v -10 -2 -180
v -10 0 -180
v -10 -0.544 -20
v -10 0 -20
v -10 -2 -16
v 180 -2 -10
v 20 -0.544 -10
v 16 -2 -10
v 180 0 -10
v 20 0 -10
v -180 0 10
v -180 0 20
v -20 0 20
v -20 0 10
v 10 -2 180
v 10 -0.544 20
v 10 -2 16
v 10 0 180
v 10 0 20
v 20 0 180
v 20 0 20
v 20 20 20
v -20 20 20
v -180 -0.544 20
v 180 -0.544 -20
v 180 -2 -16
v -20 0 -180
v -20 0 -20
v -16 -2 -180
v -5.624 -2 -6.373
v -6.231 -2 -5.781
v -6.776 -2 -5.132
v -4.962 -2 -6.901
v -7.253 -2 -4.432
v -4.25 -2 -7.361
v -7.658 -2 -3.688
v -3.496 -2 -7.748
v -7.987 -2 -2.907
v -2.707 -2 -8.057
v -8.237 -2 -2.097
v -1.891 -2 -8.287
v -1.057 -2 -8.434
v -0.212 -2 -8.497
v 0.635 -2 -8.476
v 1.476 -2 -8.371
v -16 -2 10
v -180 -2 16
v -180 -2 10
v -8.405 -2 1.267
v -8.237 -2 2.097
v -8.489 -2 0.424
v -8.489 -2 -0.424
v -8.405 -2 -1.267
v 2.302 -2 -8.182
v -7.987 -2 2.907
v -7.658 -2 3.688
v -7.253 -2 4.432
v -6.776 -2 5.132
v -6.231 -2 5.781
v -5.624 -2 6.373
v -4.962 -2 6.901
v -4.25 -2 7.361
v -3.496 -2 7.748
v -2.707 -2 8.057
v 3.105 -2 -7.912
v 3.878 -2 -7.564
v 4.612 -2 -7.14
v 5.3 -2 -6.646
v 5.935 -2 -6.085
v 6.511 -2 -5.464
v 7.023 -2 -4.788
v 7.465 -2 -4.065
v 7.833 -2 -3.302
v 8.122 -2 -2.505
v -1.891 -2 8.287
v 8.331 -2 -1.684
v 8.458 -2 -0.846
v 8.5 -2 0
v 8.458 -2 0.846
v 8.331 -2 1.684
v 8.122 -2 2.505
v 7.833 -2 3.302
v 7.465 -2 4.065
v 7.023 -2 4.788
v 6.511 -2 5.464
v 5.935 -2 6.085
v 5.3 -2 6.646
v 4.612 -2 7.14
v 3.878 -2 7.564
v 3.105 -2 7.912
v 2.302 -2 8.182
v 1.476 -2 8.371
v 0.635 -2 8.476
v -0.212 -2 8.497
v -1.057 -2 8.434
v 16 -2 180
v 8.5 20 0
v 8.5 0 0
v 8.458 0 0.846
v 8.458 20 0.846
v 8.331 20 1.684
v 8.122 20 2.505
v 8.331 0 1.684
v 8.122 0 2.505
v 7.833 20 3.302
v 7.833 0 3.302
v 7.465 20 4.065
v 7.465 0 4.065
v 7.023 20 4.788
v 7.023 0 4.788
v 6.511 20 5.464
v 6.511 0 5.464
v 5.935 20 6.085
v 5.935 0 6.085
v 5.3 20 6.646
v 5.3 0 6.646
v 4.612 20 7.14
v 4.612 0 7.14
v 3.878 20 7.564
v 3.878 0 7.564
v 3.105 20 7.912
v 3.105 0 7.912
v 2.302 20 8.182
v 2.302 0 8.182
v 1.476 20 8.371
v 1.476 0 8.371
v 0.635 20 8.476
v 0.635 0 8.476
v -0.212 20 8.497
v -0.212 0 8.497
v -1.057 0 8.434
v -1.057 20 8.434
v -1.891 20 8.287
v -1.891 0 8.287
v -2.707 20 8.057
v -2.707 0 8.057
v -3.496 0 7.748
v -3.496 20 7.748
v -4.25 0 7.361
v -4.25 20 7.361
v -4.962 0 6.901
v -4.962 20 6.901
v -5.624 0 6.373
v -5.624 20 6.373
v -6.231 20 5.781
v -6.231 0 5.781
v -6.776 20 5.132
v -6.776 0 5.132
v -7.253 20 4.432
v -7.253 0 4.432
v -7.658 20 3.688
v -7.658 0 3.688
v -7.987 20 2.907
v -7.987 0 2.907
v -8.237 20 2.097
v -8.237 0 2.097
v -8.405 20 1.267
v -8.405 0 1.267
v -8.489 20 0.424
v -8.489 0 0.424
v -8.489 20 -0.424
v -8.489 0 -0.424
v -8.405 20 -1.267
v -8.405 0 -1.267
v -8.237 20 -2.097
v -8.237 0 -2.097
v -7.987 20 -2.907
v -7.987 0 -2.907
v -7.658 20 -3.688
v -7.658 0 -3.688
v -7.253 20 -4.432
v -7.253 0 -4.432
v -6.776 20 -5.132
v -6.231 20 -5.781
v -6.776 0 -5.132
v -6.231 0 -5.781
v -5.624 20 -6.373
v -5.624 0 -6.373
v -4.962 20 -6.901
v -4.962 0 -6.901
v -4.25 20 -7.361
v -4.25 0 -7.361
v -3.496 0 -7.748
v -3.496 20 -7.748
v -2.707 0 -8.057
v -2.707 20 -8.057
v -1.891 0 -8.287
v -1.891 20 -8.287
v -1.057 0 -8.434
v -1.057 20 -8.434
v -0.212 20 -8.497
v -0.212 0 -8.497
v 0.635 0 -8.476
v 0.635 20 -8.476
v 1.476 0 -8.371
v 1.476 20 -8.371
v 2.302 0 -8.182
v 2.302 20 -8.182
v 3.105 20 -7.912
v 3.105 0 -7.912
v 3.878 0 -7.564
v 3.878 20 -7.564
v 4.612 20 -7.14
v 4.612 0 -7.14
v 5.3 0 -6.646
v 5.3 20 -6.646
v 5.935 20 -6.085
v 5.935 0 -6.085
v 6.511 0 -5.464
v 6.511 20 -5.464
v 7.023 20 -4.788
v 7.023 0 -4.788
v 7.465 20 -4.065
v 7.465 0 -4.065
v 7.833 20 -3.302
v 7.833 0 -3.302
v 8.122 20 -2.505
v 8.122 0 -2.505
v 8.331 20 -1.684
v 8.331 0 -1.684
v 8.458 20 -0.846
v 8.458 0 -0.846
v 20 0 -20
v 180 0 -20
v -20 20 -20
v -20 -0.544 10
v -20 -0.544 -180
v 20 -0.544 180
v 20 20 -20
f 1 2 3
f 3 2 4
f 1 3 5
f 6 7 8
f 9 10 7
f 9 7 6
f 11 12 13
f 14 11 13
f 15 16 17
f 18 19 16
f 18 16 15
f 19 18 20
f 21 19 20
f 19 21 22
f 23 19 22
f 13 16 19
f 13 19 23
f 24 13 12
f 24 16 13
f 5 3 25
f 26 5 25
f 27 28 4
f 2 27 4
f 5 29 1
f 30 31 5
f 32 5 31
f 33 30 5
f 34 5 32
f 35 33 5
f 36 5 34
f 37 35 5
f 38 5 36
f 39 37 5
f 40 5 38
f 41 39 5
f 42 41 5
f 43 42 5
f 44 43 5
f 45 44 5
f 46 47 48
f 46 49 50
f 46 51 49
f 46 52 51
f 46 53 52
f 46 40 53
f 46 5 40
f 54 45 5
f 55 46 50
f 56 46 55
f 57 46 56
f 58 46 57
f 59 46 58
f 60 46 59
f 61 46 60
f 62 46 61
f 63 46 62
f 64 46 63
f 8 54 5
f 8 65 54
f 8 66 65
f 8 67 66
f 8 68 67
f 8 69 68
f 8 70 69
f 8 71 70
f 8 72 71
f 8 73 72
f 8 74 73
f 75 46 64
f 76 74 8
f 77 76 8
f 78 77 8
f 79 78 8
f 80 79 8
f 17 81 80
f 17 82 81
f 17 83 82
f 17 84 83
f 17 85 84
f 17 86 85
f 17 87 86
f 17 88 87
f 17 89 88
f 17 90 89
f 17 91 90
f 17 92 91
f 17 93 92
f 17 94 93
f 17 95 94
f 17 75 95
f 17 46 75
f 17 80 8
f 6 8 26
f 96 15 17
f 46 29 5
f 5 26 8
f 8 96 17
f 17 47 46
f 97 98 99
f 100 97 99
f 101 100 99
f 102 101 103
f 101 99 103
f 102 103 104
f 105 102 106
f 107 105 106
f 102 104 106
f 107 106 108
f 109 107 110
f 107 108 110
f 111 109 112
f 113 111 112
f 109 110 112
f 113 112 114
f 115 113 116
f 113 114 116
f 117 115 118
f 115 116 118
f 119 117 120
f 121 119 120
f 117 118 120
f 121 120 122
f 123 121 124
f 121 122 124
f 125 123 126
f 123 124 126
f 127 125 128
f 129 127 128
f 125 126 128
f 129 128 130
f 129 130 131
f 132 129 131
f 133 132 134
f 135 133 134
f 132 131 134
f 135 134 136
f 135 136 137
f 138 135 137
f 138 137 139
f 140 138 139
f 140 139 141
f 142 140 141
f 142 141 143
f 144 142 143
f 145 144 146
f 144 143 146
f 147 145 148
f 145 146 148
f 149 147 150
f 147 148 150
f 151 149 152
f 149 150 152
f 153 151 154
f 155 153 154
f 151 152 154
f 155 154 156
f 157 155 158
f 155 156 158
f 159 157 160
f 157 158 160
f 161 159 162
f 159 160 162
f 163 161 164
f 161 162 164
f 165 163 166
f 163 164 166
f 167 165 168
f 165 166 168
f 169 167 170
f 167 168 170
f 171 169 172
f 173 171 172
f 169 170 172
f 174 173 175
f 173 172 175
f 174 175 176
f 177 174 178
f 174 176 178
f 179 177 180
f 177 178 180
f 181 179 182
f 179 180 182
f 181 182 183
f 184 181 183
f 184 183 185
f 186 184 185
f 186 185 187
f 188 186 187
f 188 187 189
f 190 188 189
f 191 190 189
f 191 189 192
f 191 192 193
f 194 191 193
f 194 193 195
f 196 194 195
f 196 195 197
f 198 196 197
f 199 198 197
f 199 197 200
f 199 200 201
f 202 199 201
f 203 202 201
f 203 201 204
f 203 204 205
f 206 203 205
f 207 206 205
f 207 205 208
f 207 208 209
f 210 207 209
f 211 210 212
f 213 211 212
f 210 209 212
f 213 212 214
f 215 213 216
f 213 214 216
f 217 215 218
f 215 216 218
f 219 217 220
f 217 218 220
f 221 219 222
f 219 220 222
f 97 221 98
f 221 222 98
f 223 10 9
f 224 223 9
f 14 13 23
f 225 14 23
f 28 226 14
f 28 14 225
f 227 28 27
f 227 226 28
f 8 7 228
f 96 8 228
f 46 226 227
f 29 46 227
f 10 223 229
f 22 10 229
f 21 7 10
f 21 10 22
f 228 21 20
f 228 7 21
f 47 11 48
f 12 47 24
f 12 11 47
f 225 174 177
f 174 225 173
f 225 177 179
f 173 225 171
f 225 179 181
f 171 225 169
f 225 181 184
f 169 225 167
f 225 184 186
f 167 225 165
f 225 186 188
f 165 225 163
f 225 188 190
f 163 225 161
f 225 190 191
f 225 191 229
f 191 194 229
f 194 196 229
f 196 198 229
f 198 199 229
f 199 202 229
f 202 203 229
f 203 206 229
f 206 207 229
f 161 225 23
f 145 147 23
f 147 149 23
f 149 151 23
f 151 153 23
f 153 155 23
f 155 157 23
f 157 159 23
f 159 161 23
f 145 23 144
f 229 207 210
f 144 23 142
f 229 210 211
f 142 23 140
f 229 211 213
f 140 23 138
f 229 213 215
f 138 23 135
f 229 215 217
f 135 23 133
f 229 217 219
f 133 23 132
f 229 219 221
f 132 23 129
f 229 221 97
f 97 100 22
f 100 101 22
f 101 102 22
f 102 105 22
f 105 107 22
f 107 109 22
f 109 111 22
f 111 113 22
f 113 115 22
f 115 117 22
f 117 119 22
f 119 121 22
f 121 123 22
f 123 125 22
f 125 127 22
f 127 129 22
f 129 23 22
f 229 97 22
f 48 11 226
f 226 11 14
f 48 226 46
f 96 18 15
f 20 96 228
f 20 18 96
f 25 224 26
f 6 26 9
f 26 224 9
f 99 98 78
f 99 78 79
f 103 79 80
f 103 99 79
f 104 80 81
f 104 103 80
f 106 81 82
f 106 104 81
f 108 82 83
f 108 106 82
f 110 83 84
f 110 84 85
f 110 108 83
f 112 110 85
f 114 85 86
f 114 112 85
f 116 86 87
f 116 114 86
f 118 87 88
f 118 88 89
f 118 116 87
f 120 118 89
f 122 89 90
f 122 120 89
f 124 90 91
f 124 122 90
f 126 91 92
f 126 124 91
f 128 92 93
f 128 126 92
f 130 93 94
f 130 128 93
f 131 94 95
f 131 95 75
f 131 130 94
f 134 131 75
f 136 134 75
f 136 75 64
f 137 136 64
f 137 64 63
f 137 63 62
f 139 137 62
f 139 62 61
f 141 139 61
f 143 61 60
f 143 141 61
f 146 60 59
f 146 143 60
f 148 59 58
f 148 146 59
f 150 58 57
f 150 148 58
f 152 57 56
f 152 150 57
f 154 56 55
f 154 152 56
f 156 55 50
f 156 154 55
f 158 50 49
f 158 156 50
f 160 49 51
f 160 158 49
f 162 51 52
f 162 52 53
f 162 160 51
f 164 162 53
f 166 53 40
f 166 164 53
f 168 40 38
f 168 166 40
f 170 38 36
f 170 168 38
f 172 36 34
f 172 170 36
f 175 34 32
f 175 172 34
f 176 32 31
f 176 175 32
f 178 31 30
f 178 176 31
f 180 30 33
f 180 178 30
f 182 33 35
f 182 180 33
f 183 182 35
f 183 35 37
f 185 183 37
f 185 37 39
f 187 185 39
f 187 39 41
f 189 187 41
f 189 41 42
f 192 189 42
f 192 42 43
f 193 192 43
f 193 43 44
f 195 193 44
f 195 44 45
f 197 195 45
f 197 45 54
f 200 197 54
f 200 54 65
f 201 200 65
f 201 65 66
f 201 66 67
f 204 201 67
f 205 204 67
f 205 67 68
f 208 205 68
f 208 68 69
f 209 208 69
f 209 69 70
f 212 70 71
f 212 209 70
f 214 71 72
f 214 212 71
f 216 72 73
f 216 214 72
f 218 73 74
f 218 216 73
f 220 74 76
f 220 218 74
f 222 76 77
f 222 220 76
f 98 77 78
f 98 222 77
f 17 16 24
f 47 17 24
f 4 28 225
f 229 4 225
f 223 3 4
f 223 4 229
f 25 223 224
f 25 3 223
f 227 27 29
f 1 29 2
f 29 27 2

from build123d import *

# Parameters (mm, degrees)
F0_W     = 10
F0_H     = 160
F0_W_2   = 160
F0_H_2   = 10
F0_R     = 8.5
F1_DEPTH = 2
F2_DEPTH = 20
F3_SIZE2 = 1.4558809371
F3_SIZE  = 4


with BuildPart() as f1:
    # F0 (on Front) → F1 (new body)
    with BuildSketch(Plane.XZ):
        with Locations((15, 100)):
            Rectangle(F0_W, F0_H)
        with Locations((-100, 15)):
            Rectangle(F0_W_2, F0_H_2)
        Polygon((-10, -20), (20, -20), (20, -10), (20, 20), (10, 20), (-20, 20), (-20, 10), (-20, -20), align=None)
        Circle(F0_R, mode=Mode.SUBTRACT)
        with Locations((100, -15)):
            Rectangle(F0_W_2, F0_H_2)
        with Locations((-15, -100)):
            Rectangle(F0_W, F0_H)
    extrude(amount=F1_DEPTH)

    # F0 (on Front) → F2 (join)
    with BuildSketch(Plane.XZ):
        Polygon((-10, -20), (20, -20), (20, -10), (20, 20), (10, 20), (-20, 20), (-20, 10), (-20, -20), align=None)
        Circle(F0_R, mode=Mode.SUBTRACT)
    extrude(amount=-F2_DEPTH)

    # F3
    f3_edges = [f1.edges().sort_by_distance(p)[0] for p in [
        (-85, -2, 20),
        (20, -2, 85),
        (85, -2, -20),
        (-20, -2, -85),
    ]]
    f3_side = f1.faces().sort_by_distance((15, -2, 174.908831))[0]
    chamfer(f3_edges, length=F3_SIZE, length2=F3_SIZE2, reference=f3_side)


solid = f1.part
